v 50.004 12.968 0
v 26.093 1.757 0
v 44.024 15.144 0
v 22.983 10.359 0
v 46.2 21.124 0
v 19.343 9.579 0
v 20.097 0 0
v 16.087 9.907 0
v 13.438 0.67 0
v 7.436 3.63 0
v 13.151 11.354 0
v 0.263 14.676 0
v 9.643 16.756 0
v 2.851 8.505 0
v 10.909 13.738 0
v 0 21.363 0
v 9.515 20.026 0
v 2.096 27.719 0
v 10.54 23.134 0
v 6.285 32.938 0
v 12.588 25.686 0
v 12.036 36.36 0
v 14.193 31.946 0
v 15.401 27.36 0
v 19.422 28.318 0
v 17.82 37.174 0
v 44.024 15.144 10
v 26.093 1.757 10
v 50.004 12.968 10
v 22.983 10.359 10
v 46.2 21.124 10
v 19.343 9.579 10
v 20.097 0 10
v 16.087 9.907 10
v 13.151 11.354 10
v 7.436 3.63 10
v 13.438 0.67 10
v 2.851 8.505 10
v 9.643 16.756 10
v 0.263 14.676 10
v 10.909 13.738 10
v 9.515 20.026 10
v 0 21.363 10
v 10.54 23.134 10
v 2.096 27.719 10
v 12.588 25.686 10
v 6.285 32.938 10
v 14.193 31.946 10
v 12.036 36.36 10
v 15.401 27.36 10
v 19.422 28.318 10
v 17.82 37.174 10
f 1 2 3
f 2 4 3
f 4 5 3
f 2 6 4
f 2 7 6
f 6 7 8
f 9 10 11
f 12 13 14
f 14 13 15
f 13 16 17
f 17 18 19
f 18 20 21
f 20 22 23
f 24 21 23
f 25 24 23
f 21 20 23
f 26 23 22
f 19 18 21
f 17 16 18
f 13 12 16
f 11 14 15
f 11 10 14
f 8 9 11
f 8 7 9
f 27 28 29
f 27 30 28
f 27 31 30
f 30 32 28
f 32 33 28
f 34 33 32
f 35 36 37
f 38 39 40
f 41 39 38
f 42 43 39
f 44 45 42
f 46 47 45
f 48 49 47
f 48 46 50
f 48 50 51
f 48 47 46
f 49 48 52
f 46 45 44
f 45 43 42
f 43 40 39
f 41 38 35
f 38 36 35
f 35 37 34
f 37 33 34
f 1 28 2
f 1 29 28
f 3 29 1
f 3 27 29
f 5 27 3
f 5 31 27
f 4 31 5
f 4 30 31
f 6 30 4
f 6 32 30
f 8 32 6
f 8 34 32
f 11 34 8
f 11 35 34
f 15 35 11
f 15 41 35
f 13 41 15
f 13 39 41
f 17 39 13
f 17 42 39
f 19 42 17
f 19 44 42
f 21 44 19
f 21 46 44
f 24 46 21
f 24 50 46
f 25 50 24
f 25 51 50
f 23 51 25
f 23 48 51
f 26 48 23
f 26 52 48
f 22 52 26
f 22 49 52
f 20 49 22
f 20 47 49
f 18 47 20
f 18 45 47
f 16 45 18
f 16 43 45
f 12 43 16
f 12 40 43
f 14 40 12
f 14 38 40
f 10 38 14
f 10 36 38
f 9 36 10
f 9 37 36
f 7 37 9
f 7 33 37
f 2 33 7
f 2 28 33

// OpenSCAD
$fn = 32;

// ----------------------------------------------------------------------
// Hook plate: curl radius 14 mm over 205 degrees, 9 mm thick band
// ----------------------------------------------------------------------

// --- parameters (mm) ---
profile_height = 10;      // extrusion height
profile_points = 26;      // points of the closed outline

profile = [[14.193, 31.946], [17.82, 37.174], [12.036, 36.36], [6.285, 32.938], [2.096, 27.719], [0, 21.363], [0.263, 14.676], [2.851, 8.505], [7.436, 3.63], [13.438, 0.67], [20.097, 0], [26.093, 1.757], [50.004, 12.968], [44.024, 15.144], [46.2, 21.124], [22.983, 10.359], [19.343, 9.579], [16.087, 9.907], [13.151, 11.354], [10.909, 13.738], [9.643, 16.756], [9.515, 20.026], [10.54, 23.134], [12.588, 25.686], [15.401, 27.36], [19.422, 28.318]];  // single closed polygon, 26 points, counter clockwise

// --- the one profile operation ---
linear_extrude(height = profile_height) polygon(points = profile);
